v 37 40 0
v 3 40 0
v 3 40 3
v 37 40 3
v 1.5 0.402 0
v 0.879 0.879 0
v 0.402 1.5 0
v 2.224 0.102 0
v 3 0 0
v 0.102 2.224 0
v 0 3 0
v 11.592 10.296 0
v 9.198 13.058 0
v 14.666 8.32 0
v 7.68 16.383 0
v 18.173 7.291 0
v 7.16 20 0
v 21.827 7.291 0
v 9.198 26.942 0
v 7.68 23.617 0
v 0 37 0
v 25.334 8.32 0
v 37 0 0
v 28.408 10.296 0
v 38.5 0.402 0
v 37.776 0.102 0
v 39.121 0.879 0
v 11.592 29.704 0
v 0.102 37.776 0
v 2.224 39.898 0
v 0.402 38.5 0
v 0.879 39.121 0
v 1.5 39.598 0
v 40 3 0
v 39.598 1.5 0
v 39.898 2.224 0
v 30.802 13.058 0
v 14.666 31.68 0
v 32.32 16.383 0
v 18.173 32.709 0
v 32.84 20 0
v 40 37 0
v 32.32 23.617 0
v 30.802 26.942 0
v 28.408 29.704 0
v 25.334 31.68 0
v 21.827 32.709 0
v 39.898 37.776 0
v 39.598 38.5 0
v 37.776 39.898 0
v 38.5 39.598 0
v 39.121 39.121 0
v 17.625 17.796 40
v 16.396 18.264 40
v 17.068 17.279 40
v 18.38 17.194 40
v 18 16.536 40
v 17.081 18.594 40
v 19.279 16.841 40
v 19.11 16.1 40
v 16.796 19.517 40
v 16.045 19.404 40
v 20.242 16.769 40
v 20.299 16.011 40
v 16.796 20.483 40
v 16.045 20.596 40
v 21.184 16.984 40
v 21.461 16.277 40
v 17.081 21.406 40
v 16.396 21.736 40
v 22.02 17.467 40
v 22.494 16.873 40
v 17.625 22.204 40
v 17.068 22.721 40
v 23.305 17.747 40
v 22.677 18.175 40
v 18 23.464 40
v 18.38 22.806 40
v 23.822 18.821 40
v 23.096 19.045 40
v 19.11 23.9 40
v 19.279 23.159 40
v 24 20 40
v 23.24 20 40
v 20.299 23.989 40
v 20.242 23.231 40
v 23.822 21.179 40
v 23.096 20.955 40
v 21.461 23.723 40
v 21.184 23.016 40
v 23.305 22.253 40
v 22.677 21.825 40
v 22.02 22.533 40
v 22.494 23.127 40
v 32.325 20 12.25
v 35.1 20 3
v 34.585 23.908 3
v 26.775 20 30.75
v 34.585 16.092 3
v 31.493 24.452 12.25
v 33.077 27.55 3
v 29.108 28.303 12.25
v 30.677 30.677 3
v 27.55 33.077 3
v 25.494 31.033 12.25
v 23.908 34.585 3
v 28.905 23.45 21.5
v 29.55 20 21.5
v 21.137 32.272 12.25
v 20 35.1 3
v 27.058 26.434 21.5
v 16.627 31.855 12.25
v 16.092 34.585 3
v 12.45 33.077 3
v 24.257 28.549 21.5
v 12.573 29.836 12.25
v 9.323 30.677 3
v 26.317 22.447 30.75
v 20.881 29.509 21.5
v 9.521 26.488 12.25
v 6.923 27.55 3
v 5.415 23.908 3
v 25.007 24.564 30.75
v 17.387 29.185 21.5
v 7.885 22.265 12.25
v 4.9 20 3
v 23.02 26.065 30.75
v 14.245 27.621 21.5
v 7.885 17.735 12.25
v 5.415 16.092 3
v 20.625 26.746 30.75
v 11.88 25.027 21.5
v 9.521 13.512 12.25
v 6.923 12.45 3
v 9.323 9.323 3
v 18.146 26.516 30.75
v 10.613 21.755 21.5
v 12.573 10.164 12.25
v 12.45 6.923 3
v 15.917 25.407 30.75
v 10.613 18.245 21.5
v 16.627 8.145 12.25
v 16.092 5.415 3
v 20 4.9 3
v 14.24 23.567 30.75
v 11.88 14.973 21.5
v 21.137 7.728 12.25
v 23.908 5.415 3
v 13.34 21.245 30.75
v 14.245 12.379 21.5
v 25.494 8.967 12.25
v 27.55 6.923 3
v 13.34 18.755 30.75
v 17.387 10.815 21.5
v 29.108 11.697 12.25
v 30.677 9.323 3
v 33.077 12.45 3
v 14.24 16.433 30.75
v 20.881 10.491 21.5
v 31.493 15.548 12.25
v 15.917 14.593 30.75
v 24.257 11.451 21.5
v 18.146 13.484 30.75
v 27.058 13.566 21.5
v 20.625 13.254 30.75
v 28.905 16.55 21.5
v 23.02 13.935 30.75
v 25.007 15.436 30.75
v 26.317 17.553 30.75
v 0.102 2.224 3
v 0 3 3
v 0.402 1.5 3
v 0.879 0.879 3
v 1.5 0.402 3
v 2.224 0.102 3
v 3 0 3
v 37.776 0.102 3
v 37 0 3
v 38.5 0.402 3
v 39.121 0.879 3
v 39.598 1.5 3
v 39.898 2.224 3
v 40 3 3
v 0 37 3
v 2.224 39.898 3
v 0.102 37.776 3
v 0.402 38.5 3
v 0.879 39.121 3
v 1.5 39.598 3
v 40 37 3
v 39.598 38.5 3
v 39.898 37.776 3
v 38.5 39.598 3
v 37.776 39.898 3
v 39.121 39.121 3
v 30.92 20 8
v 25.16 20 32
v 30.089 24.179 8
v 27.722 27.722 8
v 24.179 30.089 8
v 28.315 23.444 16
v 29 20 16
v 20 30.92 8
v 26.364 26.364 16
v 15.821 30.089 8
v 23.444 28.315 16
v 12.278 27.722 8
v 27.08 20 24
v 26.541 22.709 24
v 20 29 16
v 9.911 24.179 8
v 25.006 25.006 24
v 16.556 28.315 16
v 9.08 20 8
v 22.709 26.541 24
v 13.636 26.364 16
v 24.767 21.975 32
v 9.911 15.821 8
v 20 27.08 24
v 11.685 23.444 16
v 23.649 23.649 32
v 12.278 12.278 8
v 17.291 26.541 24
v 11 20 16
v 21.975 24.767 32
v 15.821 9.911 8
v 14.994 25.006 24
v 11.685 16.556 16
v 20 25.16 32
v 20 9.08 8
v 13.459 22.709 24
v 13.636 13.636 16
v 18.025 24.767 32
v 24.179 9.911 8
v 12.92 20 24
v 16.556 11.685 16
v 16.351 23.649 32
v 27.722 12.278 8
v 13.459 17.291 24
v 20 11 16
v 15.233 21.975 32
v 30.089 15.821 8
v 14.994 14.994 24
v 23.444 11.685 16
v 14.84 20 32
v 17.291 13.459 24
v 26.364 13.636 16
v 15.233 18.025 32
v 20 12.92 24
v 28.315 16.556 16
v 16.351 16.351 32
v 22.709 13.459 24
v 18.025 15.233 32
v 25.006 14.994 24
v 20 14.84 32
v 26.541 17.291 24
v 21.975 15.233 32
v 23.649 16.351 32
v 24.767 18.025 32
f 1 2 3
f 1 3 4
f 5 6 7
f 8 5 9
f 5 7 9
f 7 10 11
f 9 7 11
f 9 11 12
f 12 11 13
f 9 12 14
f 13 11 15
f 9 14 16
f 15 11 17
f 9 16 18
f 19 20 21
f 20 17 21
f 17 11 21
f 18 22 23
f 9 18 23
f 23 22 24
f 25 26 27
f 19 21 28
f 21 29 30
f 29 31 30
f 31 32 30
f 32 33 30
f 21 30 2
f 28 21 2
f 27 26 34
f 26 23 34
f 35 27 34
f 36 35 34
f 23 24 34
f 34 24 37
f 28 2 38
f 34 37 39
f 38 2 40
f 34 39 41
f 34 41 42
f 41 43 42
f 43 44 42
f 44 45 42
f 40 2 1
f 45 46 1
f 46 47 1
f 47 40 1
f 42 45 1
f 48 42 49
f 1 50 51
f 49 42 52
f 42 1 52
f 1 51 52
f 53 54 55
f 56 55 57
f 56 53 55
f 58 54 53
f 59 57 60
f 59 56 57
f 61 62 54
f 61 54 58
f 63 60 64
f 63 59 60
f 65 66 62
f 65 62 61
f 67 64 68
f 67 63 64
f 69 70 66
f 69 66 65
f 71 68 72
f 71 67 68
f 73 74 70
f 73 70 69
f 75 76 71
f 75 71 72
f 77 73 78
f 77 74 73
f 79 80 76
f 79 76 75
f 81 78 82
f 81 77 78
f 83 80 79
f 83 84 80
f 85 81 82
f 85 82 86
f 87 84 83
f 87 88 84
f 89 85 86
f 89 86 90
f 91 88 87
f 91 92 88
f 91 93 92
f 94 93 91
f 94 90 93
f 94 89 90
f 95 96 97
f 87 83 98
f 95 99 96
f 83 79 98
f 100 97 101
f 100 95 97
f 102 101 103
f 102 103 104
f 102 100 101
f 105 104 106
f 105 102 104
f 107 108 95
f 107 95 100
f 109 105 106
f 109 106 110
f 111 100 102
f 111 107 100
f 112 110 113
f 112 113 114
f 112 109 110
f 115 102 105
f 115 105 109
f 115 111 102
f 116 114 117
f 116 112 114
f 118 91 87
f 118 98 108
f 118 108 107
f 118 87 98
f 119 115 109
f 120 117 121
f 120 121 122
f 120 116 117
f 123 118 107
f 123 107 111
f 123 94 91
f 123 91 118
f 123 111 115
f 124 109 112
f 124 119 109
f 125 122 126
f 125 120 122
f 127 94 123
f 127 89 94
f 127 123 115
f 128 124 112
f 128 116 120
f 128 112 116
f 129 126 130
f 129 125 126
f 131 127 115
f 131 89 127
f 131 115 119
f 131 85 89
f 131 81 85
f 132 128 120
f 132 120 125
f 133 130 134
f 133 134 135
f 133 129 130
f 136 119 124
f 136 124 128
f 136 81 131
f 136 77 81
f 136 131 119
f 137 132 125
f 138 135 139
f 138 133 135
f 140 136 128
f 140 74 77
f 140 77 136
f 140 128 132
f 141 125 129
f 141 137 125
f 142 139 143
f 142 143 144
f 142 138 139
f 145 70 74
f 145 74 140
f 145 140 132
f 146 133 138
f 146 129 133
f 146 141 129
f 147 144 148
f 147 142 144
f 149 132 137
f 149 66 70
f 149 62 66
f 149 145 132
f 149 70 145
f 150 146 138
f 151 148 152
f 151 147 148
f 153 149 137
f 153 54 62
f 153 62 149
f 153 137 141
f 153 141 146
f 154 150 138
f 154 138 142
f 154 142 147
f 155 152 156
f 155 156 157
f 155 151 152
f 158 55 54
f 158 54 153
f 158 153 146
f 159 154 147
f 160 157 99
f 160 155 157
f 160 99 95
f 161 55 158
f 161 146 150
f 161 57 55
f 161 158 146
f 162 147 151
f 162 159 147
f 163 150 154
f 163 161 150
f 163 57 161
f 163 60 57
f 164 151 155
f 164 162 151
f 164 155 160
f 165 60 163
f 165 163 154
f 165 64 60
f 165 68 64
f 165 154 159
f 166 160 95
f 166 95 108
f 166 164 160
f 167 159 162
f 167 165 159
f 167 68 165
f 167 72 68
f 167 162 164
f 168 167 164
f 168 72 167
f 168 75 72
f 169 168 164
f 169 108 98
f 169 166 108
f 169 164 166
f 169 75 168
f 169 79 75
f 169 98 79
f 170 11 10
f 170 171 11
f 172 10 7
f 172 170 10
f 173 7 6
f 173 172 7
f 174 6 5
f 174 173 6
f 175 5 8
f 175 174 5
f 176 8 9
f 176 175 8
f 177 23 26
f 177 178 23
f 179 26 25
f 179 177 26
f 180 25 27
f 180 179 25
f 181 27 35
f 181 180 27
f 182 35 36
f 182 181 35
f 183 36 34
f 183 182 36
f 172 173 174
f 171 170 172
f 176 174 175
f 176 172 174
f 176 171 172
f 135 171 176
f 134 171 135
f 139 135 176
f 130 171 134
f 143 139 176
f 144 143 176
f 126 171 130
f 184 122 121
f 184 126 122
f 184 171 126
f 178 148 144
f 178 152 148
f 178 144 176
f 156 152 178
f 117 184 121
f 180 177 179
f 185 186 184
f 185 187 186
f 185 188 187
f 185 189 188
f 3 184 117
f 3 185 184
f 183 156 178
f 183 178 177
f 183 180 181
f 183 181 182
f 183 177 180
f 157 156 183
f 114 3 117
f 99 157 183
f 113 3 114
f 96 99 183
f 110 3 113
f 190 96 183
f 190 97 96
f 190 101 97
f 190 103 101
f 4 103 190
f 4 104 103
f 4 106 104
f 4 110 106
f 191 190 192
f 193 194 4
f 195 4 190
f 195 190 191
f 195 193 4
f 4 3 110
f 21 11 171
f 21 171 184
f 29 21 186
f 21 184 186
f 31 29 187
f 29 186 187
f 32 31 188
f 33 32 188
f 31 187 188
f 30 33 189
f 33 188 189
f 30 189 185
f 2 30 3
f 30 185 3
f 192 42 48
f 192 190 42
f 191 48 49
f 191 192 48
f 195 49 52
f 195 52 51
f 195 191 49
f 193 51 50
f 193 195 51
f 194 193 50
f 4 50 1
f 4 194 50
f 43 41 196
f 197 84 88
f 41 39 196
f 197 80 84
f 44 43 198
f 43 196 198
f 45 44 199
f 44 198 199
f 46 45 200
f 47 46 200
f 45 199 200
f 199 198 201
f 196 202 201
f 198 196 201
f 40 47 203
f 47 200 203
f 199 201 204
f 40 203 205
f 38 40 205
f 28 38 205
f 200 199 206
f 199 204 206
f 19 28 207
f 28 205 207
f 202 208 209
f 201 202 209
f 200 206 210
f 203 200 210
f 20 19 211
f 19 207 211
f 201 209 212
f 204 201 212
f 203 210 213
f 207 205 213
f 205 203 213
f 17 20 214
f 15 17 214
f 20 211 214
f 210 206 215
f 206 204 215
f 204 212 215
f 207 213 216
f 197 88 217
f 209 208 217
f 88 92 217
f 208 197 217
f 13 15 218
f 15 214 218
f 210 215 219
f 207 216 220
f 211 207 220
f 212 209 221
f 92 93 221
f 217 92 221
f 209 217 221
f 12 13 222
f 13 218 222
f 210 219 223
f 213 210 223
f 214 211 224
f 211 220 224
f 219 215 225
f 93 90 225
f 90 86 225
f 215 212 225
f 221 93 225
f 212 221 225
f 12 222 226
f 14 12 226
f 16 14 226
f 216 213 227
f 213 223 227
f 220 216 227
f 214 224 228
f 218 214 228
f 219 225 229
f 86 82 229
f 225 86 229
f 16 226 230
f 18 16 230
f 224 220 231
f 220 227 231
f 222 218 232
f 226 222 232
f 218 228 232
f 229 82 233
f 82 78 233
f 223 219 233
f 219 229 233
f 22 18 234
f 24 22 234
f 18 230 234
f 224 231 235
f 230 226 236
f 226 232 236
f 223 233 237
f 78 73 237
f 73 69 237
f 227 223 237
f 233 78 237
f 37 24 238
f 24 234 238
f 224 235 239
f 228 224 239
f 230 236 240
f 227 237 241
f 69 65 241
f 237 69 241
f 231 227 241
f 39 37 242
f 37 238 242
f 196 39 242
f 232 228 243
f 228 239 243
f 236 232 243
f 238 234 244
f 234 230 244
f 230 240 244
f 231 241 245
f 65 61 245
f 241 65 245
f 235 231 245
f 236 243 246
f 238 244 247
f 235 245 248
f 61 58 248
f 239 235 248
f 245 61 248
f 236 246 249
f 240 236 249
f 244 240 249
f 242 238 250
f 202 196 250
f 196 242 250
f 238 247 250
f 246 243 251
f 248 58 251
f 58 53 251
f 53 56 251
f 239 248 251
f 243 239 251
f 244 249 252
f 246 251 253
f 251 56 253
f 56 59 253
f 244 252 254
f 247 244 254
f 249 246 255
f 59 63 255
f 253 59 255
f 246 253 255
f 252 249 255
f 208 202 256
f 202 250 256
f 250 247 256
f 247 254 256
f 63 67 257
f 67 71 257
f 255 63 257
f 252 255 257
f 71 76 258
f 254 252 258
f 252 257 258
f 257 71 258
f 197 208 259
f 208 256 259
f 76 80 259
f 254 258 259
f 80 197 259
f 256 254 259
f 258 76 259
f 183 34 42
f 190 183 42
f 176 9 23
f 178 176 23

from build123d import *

# Parameters (mm, degrees)
BOX_W     = 40
BOX_H     = 40
BOX_DEPTH = 3
FILLET_R  = 3


with BuildPart() as con001:
    # Cone001 → Cone001 (revolve)
    with BuildSketch(Plane(origin=(0, 0, -9), x_dir=(1, 0, 0), z_dir=(0, -1, 0))):
        Polygon((0, 0), (15, 0), (3, 50), (0, 50), align=None)
    revolve(axis=Axis((0, 0, -9), (0, 0, 1)))


with BuildPart() as fillet_body:
    # Box → Box (new body)
    with BuildSketch(Plane(origin=(-20, -20, 0), x_dir=(1, 0, 0), z_dir=(0, 0, 1))):
        with Locations((20, 20)):
            Rectangle(BOX_W, BOX_H)
    extrude(amount=BOX_DEPTH)

    # Fillet
    fillet_edges = [fillet_body.edges().sort_by_distance(p)[0] for p in [
        (-20, -20, 1.5),
        (-20, 20, 1.5),
        (20, -20, 1.5),
        (20, 20, 1.5),
    ]]
    fillet(fillet_edges, radius=FILLET_R)


with BuildPart() as cut:
    # Cone → Cone (revolve)
    with BuildSketch(Plane.XZ):
        Polygon((0, 0), (16, 0), (4, 40), (0, 40), align=None)
    revolve(axis=Axis((0, 0, 0), (0, 0, 1)))

    # Fusion: union Fillet body
    add(fillet_body.part)

    # Cut: cut Con001
    add(con001.part, mode=Mode.SUBTRACT)


with BuildPart() as cut_1:
    # Cut placement: moved
    add(cut.part.moved(Location((20, 20, 0))))


solid = cut_1.part
